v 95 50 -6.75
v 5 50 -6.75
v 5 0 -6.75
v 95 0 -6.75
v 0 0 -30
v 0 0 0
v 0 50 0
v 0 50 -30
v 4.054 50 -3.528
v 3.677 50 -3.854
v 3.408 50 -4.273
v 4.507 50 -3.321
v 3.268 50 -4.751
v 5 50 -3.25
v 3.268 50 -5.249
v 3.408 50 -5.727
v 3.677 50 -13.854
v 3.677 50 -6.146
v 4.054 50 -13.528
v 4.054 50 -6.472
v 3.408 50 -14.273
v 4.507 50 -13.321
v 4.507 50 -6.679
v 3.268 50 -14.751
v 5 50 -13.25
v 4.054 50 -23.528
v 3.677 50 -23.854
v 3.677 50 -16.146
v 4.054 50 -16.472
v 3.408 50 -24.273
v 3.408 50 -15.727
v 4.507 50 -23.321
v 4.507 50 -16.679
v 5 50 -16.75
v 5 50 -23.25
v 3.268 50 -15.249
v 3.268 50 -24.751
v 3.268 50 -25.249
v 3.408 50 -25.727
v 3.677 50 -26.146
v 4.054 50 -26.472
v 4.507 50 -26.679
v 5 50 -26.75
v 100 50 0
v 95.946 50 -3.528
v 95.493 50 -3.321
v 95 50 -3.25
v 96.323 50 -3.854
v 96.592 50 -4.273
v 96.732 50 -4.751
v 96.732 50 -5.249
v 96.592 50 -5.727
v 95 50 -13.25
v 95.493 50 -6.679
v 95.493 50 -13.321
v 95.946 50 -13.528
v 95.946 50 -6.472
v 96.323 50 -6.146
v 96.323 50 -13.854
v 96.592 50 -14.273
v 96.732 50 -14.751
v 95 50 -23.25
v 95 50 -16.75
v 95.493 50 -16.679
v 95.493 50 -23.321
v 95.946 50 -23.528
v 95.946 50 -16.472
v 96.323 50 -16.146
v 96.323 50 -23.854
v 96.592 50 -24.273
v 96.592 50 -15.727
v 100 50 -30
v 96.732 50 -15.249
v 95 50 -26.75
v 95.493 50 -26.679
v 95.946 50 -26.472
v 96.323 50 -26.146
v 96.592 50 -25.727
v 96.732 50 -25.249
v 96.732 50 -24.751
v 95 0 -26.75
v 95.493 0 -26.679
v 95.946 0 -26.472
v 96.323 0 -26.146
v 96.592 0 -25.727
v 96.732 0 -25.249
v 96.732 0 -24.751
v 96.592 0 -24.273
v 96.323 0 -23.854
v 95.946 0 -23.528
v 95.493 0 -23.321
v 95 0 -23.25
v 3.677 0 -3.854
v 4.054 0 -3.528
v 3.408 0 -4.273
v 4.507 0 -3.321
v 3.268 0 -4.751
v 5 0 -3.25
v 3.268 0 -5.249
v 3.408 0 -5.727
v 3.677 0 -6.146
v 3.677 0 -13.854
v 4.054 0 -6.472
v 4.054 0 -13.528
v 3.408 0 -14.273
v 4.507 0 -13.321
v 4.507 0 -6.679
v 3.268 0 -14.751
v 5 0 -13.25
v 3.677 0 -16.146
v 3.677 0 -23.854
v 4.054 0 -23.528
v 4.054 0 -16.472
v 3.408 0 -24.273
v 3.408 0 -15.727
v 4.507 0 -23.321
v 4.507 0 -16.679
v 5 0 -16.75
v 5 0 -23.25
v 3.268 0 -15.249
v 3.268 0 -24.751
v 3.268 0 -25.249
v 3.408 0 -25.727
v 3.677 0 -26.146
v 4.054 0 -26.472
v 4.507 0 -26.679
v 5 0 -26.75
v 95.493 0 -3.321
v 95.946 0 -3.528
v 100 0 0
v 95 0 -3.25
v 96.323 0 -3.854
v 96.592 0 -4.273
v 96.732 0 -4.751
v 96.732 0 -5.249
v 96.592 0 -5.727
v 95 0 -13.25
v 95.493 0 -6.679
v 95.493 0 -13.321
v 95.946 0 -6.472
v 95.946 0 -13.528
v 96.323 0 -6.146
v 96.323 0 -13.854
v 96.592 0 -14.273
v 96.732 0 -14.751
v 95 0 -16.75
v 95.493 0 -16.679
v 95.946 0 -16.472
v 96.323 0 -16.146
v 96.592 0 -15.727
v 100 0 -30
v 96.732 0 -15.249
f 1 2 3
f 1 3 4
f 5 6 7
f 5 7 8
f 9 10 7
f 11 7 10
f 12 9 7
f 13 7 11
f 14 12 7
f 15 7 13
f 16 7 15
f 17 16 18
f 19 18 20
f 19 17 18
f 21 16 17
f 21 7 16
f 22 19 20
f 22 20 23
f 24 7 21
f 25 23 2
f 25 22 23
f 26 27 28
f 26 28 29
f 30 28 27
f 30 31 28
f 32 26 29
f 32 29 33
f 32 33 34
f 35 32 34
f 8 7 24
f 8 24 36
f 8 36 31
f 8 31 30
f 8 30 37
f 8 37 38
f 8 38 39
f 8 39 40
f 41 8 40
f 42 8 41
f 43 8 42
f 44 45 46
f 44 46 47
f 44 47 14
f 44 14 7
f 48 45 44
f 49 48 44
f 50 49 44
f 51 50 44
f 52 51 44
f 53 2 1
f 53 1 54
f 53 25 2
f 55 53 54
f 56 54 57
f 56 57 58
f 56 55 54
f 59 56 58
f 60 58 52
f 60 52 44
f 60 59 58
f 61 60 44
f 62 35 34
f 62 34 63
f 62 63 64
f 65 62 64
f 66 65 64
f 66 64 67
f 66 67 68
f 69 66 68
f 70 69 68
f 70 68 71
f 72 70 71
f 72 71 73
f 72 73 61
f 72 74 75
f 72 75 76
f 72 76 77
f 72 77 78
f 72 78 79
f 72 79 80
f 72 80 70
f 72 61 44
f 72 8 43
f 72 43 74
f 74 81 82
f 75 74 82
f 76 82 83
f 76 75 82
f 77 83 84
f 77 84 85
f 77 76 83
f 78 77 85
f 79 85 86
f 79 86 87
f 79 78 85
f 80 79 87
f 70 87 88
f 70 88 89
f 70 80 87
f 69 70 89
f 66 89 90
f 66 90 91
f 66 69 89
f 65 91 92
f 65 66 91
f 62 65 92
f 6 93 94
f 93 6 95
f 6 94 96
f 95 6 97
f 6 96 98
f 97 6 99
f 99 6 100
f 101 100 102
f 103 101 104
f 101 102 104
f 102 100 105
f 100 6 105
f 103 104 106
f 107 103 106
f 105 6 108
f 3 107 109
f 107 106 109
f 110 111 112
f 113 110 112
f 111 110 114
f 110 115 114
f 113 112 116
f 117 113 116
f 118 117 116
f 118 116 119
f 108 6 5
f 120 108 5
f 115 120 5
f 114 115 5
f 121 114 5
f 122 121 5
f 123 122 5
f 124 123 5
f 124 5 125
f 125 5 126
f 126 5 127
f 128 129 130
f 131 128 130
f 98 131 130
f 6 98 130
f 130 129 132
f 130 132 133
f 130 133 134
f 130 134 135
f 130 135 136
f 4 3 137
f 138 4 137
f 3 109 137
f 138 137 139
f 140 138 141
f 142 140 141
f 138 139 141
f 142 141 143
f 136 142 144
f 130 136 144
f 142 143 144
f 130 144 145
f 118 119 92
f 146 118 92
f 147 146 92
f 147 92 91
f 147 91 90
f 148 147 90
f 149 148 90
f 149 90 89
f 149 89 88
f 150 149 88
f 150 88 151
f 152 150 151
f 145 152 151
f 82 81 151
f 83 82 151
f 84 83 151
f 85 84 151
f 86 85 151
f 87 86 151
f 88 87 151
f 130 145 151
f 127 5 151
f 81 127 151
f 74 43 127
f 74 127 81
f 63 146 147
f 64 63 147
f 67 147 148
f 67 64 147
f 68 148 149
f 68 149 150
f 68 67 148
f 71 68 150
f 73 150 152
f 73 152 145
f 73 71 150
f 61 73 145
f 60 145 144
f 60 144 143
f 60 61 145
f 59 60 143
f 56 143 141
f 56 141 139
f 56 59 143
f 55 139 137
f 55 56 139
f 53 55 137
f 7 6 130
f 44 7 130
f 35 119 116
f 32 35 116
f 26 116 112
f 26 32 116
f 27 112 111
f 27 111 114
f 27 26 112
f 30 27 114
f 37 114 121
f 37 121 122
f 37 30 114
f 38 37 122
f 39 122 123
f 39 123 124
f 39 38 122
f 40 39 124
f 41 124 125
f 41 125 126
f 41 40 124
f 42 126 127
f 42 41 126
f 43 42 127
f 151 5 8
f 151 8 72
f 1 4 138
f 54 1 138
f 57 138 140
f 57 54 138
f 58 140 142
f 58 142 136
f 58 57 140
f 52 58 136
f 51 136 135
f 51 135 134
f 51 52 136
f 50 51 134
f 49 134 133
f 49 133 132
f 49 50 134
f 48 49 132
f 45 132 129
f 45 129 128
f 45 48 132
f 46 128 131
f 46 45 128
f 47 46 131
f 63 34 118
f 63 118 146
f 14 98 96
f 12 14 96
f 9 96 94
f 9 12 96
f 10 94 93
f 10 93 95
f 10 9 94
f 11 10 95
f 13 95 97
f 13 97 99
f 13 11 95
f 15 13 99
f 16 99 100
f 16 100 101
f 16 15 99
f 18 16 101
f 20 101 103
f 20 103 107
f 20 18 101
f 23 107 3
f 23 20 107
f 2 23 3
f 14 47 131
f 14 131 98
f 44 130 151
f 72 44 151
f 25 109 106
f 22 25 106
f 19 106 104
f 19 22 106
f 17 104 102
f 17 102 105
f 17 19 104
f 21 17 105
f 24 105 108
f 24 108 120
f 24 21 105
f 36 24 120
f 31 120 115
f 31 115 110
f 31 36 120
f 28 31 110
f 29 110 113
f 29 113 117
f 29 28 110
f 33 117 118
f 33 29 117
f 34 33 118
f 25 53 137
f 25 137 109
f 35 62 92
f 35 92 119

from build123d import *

# Parameters (mm, degrees)
SKETCH_1_W             = 100
SKETCH_1_H             = 30
EXTRUDE_1_DEPTH        = 50
CUT_EXTRUDE_1_DEPTH    = 50
PATTERN_LINEAR_1_COUNT = 3
PATTERN_LINEAR_1_PITCH = 10


with BuildPart() as part:
    # 草图1 → 凸台-拉伸1 (new body)
    with BuildSketch(Plane(origin=(0, 0, 0), x_dir=(1, 0, 0), z_dir=(0, 1, 0))):
        with Locations((50, 15)):
            Rectangle(SKETCH_1_W, SKETCH_1_H)
    extrude(amount=EXTRUDE_1_DEPTH)

    # 草图2 → 切除-拉伸1 (cut)
    with BuildSketch(Plane(origin=(0, 50, 0), x_dir=(1, 0, 0), z_dir=(0, 1, 0))):
        with BuildLine():
            Line((5, 6.75), (95, 6.75))
            ThreePointArc((95, 6.75), (96.75, 5), (95, 3.25))
            Line((95, 3.25), (5, 3.25))
            ThreePointArc((5, 3.25), (3.25, 5), (5, 6.75))
        make_face()
    cut_extrude_1 = extrude(amount=-CUT_EXTRUDE_1_DEPTH, mode=Mode.SUBTRACT)

    # 阵列(线性)1: 切除-拉伸1 ×3
    with Locations(*[(0, 0, -i * PATTERN_LINEAR_1_PITCH) for i in range(1, PATTERN_LINEAR_1_COUNT)]):
        add(cut_extrude_1, mode=Mode.SUBTRACT)


solid = part.part
